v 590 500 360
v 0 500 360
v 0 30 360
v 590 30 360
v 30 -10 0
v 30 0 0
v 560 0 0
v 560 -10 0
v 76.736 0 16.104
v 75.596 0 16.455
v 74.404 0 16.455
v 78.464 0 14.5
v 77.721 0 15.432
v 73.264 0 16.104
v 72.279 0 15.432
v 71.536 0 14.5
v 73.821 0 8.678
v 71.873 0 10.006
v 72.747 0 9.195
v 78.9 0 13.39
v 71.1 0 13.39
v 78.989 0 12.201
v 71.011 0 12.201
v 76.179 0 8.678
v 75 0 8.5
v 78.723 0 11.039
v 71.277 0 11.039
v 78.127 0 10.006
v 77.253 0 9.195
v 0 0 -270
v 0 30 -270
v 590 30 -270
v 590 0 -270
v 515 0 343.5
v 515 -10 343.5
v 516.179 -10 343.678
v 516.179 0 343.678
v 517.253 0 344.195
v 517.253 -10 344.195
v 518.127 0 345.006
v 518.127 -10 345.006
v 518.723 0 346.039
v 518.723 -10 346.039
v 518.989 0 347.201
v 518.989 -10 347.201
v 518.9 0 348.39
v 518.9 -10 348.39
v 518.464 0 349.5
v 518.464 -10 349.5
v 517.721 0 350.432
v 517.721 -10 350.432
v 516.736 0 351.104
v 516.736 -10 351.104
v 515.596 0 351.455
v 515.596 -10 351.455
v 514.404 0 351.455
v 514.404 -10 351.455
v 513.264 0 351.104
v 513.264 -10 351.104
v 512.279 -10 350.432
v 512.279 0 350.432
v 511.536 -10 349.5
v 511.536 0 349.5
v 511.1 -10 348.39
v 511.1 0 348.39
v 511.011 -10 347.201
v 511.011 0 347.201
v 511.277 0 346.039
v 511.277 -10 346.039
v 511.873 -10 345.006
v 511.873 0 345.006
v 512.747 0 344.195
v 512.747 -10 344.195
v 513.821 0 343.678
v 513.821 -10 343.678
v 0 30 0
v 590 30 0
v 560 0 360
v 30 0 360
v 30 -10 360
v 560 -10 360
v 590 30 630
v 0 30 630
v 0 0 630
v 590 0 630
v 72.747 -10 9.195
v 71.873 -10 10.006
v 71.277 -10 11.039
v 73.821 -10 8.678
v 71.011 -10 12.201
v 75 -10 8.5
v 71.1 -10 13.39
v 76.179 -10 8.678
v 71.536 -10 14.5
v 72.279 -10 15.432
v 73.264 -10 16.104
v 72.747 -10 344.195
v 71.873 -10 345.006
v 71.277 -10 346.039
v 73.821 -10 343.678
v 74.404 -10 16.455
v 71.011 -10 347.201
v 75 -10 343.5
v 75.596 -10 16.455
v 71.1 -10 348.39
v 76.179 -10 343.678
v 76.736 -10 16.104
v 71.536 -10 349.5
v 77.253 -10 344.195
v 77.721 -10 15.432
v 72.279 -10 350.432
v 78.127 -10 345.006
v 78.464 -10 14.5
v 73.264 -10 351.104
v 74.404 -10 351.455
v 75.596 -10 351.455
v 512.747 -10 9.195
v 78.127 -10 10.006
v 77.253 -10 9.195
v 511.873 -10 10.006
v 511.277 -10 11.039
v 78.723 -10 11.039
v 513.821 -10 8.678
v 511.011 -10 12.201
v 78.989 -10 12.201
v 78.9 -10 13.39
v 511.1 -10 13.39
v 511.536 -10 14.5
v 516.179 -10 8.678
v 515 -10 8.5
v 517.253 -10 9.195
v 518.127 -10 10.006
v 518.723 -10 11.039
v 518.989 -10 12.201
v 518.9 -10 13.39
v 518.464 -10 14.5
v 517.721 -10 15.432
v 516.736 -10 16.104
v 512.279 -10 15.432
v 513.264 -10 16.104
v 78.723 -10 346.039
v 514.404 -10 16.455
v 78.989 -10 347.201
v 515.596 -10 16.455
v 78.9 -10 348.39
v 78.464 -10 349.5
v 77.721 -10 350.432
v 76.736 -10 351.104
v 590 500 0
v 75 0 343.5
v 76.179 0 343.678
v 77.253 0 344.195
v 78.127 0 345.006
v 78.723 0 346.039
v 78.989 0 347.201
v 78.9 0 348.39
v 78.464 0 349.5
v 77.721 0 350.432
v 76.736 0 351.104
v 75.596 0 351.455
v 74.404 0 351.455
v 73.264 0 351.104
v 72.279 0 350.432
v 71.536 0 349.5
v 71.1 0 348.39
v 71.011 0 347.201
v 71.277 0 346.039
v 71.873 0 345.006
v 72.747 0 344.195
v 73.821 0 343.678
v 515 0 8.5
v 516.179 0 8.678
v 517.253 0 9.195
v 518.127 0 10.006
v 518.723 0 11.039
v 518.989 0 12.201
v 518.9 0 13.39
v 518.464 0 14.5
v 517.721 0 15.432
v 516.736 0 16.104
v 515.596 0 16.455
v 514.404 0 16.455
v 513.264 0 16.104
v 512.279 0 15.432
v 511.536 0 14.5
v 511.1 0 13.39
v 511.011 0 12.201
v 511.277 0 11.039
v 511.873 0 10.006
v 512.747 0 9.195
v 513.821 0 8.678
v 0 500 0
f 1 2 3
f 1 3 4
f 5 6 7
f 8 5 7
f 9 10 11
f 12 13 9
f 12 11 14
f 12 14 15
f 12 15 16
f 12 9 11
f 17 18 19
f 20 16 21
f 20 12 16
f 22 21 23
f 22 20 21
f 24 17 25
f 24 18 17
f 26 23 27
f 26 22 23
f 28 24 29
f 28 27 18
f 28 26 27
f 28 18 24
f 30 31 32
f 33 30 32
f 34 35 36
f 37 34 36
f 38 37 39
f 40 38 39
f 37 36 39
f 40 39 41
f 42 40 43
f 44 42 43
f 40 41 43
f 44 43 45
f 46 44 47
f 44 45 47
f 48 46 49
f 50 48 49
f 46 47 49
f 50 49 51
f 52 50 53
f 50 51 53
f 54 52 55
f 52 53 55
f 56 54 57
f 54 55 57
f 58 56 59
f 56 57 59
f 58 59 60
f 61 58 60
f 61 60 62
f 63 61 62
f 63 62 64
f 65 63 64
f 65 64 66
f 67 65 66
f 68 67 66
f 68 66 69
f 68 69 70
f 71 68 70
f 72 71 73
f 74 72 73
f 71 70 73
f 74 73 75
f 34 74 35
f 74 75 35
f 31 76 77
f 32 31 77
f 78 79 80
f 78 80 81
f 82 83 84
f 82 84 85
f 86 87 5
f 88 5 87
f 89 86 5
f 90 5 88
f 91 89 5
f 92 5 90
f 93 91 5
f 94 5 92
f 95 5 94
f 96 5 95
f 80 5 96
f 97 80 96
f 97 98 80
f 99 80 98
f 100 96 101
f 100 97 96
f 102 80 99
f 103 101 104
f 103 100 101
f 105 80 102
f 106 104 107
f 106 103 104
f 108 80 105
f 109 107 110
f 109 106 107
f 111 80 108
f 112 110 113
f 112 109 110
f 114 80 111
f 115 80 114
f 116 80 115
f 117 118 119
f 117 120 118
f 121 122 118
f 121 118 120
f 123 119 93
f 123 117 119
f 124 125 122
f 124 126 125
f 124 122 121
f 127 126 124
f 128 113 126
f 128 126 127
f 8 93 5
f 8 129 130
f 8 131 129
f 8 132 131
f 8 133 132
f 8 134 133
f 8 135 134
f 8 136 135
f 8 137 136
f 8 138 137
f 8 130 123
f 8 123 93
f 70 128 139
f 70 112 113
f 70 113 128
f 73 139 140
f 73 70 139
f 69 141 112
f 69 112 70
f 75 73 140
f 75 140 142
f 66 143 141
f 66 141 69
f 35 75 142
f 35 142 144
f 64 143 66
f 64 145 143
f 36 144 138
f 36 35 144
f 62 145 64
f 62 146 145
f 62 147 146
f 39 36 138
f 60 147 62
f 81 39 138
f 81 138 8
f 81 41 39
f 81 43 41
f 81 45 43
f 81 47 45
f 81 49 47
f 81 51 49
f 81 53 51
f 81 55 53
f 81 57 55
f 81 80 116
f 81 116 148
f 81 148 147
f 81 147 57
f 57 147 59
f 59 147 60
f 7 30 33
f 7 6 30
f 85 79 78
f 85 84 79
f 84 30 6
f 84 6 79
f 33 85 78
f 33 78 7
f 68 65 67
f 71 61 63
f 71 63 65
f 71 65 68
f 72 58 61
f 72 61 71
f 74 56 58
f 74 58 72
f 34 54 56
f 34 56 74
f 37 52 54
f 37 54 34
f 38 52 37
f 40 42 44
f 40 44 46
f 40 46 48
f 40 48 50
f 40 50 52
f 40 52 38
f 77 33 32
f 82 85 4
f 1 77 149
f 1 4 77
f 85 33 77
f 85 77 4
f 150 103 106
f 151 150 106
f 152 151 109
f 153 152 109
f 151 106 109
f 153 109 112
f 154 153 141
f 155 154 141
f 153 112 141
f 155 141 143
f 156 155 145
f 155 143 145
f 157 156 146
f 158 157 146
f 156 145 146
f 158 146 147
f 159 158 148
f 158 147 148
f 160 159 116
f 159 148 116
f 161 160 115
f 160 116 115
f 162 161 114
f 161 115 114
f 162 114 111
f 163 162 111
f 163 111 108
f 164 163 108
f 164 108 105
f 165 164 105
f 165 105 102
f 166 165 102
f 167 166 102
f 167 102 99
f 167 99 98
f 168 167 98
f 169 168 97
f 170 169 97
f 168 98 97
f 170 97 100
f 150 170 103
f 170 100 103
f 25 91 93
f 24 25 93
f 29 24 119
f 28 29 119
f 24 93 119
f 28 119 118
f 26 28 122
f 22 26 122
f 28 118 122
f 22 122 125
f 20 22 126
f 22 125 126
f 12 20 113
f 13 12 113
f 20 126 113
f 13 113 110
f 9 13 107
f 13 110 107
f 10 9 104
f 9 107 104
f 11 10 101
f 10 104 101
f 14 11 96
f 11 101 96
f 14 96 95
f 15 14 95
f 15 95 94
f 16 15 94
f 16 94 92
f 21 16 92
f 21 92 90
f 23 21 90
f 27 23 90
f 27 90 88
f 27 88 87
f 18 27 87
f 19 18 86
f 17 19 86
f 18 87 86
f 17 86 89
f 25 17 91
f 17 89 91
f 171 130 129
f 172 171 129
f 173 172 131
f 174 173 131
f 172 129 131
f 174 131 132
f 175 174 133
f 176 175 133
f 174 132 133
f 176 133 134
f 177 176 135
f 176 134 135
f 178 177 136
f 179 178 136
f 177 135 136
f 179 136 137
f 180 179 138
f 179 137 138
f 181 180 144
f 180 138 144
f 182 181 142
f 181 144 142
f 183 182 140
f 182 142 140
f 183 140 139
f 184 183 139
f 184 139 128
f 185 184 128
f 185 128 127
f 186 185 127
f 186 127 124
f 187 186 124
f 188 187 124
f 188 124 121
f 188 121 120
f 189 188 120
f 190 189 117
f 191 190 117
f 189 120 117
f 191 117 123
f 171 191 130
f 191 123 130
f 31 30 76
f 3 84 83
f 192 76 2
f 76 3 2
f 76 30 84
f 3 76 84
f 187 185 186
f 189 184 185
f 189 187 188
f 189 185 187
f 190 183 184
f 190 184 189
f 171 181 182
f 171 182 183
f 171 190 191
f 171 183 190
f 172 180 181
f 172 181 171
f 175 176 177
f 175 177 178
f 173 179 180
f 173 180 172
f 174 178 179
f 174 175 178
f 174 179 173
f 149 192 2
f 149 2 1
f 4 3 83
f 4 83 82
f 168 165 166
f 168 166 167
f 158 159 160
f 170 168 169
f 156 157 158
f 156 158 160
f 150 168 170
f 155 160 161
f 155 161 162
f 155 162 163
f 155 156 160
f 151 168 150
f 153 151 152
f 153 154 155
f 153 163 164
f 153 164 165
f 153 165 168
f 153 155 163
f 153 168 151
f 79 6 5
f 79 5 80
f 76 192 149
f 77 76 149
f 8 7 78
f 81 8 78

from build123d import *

# Parameters (mm, degrees)
ESQUISSE1_W             = 590
ESQUISSE1_H             = 500
BOSS_EXTRU_1_DEPTH      = 360
ESQUISSE2_W             = 530
ESQUISSE2_H             = 360
BOSS_EXTRU_2_DEPTH      = 10
ESQUISSE3_R             = 4
ENL_V_MAT_EXTRU_1_DEPTH = 10
ESQUISSE4_W             = 590
ESQUISSE4_H             = 30
BOSS_EXTRU_3_DEPTH      = 270
BOSS_EXTRU_4_START      = -360
ESQUISSE4_2_W           = 590
ESQUISSE4_2_H           = 30
BOSS_EXTRU_4_DEPTH      = 270


with BuildPart() as part:
    # Esquisse1 → Boss.-Extru.1 (new body)
    with BuildSketch(Plane.XY):
        with Locations((295, 250)):
            Rectangle(ESQUISSE1_W, ESQUISSE1_H)
    extrude(amount=BOSS_EXTRU_1_DEPTH)

    # Esquisse2 → Boss.-Extru.2 (add)
    with BuildSketch(Plane.XZ):
        with Locations((295, 180)):
            Rectangle(ESQUISSE2_W, ESQUISSE2_H)
    extrude(amount=BOSS_EXTRU_2_DEPTH)

    # Esquisse3 → Enlèv. mat.-Extru.1 (cut)
    with BuildSketch(Plane.XZ.offset(10)):
        with Locations(Location((75, 12.5, 0), (0, 0, 270))):
            Circle(ESQUISSE3_R)
        with Locations(Location((515, 12.5, 0), (0, 0, 270))):
            Circle(ESQUISSE3_R)
        with Locations(Location((515, 347.5, 0), (0, 0, 270))):
            Circle(ESQUISSE3_R)
        with Locations(Location((75, 347.5, 0), (0, 0, 270))):
            Circle(ESQUISSE3_R)
    extrude(amount=-ENL_V_MAT_EXTRU_1_DEPTH, mode=Mode.SUBTRACT)

    # Esquisse4 → Boss.-Extru.3 (add)
    with BuildSketch(Plane.XY.offset(360)):
        with Locations((295, 15)):
            Rectangle(ESQUISSE4_W, ESQUISSE4_H)
    extrude(amount=BOSS_EXTRU_3_DEPTH)

    # Esquisse4<2> → Boss.-Extru.4 (add)
    with BuildSketch(Plane.XY.offset(360).offset(BOSS_EXTRU_4_START)):
        with Locations((295, 15)):
            Rectangle(ESQUISSE4_2_W, ESQUISSE4_2_H)
    extrude(amount=-BOSS_EXTRU_4_DEPTH)


solid = part.part
